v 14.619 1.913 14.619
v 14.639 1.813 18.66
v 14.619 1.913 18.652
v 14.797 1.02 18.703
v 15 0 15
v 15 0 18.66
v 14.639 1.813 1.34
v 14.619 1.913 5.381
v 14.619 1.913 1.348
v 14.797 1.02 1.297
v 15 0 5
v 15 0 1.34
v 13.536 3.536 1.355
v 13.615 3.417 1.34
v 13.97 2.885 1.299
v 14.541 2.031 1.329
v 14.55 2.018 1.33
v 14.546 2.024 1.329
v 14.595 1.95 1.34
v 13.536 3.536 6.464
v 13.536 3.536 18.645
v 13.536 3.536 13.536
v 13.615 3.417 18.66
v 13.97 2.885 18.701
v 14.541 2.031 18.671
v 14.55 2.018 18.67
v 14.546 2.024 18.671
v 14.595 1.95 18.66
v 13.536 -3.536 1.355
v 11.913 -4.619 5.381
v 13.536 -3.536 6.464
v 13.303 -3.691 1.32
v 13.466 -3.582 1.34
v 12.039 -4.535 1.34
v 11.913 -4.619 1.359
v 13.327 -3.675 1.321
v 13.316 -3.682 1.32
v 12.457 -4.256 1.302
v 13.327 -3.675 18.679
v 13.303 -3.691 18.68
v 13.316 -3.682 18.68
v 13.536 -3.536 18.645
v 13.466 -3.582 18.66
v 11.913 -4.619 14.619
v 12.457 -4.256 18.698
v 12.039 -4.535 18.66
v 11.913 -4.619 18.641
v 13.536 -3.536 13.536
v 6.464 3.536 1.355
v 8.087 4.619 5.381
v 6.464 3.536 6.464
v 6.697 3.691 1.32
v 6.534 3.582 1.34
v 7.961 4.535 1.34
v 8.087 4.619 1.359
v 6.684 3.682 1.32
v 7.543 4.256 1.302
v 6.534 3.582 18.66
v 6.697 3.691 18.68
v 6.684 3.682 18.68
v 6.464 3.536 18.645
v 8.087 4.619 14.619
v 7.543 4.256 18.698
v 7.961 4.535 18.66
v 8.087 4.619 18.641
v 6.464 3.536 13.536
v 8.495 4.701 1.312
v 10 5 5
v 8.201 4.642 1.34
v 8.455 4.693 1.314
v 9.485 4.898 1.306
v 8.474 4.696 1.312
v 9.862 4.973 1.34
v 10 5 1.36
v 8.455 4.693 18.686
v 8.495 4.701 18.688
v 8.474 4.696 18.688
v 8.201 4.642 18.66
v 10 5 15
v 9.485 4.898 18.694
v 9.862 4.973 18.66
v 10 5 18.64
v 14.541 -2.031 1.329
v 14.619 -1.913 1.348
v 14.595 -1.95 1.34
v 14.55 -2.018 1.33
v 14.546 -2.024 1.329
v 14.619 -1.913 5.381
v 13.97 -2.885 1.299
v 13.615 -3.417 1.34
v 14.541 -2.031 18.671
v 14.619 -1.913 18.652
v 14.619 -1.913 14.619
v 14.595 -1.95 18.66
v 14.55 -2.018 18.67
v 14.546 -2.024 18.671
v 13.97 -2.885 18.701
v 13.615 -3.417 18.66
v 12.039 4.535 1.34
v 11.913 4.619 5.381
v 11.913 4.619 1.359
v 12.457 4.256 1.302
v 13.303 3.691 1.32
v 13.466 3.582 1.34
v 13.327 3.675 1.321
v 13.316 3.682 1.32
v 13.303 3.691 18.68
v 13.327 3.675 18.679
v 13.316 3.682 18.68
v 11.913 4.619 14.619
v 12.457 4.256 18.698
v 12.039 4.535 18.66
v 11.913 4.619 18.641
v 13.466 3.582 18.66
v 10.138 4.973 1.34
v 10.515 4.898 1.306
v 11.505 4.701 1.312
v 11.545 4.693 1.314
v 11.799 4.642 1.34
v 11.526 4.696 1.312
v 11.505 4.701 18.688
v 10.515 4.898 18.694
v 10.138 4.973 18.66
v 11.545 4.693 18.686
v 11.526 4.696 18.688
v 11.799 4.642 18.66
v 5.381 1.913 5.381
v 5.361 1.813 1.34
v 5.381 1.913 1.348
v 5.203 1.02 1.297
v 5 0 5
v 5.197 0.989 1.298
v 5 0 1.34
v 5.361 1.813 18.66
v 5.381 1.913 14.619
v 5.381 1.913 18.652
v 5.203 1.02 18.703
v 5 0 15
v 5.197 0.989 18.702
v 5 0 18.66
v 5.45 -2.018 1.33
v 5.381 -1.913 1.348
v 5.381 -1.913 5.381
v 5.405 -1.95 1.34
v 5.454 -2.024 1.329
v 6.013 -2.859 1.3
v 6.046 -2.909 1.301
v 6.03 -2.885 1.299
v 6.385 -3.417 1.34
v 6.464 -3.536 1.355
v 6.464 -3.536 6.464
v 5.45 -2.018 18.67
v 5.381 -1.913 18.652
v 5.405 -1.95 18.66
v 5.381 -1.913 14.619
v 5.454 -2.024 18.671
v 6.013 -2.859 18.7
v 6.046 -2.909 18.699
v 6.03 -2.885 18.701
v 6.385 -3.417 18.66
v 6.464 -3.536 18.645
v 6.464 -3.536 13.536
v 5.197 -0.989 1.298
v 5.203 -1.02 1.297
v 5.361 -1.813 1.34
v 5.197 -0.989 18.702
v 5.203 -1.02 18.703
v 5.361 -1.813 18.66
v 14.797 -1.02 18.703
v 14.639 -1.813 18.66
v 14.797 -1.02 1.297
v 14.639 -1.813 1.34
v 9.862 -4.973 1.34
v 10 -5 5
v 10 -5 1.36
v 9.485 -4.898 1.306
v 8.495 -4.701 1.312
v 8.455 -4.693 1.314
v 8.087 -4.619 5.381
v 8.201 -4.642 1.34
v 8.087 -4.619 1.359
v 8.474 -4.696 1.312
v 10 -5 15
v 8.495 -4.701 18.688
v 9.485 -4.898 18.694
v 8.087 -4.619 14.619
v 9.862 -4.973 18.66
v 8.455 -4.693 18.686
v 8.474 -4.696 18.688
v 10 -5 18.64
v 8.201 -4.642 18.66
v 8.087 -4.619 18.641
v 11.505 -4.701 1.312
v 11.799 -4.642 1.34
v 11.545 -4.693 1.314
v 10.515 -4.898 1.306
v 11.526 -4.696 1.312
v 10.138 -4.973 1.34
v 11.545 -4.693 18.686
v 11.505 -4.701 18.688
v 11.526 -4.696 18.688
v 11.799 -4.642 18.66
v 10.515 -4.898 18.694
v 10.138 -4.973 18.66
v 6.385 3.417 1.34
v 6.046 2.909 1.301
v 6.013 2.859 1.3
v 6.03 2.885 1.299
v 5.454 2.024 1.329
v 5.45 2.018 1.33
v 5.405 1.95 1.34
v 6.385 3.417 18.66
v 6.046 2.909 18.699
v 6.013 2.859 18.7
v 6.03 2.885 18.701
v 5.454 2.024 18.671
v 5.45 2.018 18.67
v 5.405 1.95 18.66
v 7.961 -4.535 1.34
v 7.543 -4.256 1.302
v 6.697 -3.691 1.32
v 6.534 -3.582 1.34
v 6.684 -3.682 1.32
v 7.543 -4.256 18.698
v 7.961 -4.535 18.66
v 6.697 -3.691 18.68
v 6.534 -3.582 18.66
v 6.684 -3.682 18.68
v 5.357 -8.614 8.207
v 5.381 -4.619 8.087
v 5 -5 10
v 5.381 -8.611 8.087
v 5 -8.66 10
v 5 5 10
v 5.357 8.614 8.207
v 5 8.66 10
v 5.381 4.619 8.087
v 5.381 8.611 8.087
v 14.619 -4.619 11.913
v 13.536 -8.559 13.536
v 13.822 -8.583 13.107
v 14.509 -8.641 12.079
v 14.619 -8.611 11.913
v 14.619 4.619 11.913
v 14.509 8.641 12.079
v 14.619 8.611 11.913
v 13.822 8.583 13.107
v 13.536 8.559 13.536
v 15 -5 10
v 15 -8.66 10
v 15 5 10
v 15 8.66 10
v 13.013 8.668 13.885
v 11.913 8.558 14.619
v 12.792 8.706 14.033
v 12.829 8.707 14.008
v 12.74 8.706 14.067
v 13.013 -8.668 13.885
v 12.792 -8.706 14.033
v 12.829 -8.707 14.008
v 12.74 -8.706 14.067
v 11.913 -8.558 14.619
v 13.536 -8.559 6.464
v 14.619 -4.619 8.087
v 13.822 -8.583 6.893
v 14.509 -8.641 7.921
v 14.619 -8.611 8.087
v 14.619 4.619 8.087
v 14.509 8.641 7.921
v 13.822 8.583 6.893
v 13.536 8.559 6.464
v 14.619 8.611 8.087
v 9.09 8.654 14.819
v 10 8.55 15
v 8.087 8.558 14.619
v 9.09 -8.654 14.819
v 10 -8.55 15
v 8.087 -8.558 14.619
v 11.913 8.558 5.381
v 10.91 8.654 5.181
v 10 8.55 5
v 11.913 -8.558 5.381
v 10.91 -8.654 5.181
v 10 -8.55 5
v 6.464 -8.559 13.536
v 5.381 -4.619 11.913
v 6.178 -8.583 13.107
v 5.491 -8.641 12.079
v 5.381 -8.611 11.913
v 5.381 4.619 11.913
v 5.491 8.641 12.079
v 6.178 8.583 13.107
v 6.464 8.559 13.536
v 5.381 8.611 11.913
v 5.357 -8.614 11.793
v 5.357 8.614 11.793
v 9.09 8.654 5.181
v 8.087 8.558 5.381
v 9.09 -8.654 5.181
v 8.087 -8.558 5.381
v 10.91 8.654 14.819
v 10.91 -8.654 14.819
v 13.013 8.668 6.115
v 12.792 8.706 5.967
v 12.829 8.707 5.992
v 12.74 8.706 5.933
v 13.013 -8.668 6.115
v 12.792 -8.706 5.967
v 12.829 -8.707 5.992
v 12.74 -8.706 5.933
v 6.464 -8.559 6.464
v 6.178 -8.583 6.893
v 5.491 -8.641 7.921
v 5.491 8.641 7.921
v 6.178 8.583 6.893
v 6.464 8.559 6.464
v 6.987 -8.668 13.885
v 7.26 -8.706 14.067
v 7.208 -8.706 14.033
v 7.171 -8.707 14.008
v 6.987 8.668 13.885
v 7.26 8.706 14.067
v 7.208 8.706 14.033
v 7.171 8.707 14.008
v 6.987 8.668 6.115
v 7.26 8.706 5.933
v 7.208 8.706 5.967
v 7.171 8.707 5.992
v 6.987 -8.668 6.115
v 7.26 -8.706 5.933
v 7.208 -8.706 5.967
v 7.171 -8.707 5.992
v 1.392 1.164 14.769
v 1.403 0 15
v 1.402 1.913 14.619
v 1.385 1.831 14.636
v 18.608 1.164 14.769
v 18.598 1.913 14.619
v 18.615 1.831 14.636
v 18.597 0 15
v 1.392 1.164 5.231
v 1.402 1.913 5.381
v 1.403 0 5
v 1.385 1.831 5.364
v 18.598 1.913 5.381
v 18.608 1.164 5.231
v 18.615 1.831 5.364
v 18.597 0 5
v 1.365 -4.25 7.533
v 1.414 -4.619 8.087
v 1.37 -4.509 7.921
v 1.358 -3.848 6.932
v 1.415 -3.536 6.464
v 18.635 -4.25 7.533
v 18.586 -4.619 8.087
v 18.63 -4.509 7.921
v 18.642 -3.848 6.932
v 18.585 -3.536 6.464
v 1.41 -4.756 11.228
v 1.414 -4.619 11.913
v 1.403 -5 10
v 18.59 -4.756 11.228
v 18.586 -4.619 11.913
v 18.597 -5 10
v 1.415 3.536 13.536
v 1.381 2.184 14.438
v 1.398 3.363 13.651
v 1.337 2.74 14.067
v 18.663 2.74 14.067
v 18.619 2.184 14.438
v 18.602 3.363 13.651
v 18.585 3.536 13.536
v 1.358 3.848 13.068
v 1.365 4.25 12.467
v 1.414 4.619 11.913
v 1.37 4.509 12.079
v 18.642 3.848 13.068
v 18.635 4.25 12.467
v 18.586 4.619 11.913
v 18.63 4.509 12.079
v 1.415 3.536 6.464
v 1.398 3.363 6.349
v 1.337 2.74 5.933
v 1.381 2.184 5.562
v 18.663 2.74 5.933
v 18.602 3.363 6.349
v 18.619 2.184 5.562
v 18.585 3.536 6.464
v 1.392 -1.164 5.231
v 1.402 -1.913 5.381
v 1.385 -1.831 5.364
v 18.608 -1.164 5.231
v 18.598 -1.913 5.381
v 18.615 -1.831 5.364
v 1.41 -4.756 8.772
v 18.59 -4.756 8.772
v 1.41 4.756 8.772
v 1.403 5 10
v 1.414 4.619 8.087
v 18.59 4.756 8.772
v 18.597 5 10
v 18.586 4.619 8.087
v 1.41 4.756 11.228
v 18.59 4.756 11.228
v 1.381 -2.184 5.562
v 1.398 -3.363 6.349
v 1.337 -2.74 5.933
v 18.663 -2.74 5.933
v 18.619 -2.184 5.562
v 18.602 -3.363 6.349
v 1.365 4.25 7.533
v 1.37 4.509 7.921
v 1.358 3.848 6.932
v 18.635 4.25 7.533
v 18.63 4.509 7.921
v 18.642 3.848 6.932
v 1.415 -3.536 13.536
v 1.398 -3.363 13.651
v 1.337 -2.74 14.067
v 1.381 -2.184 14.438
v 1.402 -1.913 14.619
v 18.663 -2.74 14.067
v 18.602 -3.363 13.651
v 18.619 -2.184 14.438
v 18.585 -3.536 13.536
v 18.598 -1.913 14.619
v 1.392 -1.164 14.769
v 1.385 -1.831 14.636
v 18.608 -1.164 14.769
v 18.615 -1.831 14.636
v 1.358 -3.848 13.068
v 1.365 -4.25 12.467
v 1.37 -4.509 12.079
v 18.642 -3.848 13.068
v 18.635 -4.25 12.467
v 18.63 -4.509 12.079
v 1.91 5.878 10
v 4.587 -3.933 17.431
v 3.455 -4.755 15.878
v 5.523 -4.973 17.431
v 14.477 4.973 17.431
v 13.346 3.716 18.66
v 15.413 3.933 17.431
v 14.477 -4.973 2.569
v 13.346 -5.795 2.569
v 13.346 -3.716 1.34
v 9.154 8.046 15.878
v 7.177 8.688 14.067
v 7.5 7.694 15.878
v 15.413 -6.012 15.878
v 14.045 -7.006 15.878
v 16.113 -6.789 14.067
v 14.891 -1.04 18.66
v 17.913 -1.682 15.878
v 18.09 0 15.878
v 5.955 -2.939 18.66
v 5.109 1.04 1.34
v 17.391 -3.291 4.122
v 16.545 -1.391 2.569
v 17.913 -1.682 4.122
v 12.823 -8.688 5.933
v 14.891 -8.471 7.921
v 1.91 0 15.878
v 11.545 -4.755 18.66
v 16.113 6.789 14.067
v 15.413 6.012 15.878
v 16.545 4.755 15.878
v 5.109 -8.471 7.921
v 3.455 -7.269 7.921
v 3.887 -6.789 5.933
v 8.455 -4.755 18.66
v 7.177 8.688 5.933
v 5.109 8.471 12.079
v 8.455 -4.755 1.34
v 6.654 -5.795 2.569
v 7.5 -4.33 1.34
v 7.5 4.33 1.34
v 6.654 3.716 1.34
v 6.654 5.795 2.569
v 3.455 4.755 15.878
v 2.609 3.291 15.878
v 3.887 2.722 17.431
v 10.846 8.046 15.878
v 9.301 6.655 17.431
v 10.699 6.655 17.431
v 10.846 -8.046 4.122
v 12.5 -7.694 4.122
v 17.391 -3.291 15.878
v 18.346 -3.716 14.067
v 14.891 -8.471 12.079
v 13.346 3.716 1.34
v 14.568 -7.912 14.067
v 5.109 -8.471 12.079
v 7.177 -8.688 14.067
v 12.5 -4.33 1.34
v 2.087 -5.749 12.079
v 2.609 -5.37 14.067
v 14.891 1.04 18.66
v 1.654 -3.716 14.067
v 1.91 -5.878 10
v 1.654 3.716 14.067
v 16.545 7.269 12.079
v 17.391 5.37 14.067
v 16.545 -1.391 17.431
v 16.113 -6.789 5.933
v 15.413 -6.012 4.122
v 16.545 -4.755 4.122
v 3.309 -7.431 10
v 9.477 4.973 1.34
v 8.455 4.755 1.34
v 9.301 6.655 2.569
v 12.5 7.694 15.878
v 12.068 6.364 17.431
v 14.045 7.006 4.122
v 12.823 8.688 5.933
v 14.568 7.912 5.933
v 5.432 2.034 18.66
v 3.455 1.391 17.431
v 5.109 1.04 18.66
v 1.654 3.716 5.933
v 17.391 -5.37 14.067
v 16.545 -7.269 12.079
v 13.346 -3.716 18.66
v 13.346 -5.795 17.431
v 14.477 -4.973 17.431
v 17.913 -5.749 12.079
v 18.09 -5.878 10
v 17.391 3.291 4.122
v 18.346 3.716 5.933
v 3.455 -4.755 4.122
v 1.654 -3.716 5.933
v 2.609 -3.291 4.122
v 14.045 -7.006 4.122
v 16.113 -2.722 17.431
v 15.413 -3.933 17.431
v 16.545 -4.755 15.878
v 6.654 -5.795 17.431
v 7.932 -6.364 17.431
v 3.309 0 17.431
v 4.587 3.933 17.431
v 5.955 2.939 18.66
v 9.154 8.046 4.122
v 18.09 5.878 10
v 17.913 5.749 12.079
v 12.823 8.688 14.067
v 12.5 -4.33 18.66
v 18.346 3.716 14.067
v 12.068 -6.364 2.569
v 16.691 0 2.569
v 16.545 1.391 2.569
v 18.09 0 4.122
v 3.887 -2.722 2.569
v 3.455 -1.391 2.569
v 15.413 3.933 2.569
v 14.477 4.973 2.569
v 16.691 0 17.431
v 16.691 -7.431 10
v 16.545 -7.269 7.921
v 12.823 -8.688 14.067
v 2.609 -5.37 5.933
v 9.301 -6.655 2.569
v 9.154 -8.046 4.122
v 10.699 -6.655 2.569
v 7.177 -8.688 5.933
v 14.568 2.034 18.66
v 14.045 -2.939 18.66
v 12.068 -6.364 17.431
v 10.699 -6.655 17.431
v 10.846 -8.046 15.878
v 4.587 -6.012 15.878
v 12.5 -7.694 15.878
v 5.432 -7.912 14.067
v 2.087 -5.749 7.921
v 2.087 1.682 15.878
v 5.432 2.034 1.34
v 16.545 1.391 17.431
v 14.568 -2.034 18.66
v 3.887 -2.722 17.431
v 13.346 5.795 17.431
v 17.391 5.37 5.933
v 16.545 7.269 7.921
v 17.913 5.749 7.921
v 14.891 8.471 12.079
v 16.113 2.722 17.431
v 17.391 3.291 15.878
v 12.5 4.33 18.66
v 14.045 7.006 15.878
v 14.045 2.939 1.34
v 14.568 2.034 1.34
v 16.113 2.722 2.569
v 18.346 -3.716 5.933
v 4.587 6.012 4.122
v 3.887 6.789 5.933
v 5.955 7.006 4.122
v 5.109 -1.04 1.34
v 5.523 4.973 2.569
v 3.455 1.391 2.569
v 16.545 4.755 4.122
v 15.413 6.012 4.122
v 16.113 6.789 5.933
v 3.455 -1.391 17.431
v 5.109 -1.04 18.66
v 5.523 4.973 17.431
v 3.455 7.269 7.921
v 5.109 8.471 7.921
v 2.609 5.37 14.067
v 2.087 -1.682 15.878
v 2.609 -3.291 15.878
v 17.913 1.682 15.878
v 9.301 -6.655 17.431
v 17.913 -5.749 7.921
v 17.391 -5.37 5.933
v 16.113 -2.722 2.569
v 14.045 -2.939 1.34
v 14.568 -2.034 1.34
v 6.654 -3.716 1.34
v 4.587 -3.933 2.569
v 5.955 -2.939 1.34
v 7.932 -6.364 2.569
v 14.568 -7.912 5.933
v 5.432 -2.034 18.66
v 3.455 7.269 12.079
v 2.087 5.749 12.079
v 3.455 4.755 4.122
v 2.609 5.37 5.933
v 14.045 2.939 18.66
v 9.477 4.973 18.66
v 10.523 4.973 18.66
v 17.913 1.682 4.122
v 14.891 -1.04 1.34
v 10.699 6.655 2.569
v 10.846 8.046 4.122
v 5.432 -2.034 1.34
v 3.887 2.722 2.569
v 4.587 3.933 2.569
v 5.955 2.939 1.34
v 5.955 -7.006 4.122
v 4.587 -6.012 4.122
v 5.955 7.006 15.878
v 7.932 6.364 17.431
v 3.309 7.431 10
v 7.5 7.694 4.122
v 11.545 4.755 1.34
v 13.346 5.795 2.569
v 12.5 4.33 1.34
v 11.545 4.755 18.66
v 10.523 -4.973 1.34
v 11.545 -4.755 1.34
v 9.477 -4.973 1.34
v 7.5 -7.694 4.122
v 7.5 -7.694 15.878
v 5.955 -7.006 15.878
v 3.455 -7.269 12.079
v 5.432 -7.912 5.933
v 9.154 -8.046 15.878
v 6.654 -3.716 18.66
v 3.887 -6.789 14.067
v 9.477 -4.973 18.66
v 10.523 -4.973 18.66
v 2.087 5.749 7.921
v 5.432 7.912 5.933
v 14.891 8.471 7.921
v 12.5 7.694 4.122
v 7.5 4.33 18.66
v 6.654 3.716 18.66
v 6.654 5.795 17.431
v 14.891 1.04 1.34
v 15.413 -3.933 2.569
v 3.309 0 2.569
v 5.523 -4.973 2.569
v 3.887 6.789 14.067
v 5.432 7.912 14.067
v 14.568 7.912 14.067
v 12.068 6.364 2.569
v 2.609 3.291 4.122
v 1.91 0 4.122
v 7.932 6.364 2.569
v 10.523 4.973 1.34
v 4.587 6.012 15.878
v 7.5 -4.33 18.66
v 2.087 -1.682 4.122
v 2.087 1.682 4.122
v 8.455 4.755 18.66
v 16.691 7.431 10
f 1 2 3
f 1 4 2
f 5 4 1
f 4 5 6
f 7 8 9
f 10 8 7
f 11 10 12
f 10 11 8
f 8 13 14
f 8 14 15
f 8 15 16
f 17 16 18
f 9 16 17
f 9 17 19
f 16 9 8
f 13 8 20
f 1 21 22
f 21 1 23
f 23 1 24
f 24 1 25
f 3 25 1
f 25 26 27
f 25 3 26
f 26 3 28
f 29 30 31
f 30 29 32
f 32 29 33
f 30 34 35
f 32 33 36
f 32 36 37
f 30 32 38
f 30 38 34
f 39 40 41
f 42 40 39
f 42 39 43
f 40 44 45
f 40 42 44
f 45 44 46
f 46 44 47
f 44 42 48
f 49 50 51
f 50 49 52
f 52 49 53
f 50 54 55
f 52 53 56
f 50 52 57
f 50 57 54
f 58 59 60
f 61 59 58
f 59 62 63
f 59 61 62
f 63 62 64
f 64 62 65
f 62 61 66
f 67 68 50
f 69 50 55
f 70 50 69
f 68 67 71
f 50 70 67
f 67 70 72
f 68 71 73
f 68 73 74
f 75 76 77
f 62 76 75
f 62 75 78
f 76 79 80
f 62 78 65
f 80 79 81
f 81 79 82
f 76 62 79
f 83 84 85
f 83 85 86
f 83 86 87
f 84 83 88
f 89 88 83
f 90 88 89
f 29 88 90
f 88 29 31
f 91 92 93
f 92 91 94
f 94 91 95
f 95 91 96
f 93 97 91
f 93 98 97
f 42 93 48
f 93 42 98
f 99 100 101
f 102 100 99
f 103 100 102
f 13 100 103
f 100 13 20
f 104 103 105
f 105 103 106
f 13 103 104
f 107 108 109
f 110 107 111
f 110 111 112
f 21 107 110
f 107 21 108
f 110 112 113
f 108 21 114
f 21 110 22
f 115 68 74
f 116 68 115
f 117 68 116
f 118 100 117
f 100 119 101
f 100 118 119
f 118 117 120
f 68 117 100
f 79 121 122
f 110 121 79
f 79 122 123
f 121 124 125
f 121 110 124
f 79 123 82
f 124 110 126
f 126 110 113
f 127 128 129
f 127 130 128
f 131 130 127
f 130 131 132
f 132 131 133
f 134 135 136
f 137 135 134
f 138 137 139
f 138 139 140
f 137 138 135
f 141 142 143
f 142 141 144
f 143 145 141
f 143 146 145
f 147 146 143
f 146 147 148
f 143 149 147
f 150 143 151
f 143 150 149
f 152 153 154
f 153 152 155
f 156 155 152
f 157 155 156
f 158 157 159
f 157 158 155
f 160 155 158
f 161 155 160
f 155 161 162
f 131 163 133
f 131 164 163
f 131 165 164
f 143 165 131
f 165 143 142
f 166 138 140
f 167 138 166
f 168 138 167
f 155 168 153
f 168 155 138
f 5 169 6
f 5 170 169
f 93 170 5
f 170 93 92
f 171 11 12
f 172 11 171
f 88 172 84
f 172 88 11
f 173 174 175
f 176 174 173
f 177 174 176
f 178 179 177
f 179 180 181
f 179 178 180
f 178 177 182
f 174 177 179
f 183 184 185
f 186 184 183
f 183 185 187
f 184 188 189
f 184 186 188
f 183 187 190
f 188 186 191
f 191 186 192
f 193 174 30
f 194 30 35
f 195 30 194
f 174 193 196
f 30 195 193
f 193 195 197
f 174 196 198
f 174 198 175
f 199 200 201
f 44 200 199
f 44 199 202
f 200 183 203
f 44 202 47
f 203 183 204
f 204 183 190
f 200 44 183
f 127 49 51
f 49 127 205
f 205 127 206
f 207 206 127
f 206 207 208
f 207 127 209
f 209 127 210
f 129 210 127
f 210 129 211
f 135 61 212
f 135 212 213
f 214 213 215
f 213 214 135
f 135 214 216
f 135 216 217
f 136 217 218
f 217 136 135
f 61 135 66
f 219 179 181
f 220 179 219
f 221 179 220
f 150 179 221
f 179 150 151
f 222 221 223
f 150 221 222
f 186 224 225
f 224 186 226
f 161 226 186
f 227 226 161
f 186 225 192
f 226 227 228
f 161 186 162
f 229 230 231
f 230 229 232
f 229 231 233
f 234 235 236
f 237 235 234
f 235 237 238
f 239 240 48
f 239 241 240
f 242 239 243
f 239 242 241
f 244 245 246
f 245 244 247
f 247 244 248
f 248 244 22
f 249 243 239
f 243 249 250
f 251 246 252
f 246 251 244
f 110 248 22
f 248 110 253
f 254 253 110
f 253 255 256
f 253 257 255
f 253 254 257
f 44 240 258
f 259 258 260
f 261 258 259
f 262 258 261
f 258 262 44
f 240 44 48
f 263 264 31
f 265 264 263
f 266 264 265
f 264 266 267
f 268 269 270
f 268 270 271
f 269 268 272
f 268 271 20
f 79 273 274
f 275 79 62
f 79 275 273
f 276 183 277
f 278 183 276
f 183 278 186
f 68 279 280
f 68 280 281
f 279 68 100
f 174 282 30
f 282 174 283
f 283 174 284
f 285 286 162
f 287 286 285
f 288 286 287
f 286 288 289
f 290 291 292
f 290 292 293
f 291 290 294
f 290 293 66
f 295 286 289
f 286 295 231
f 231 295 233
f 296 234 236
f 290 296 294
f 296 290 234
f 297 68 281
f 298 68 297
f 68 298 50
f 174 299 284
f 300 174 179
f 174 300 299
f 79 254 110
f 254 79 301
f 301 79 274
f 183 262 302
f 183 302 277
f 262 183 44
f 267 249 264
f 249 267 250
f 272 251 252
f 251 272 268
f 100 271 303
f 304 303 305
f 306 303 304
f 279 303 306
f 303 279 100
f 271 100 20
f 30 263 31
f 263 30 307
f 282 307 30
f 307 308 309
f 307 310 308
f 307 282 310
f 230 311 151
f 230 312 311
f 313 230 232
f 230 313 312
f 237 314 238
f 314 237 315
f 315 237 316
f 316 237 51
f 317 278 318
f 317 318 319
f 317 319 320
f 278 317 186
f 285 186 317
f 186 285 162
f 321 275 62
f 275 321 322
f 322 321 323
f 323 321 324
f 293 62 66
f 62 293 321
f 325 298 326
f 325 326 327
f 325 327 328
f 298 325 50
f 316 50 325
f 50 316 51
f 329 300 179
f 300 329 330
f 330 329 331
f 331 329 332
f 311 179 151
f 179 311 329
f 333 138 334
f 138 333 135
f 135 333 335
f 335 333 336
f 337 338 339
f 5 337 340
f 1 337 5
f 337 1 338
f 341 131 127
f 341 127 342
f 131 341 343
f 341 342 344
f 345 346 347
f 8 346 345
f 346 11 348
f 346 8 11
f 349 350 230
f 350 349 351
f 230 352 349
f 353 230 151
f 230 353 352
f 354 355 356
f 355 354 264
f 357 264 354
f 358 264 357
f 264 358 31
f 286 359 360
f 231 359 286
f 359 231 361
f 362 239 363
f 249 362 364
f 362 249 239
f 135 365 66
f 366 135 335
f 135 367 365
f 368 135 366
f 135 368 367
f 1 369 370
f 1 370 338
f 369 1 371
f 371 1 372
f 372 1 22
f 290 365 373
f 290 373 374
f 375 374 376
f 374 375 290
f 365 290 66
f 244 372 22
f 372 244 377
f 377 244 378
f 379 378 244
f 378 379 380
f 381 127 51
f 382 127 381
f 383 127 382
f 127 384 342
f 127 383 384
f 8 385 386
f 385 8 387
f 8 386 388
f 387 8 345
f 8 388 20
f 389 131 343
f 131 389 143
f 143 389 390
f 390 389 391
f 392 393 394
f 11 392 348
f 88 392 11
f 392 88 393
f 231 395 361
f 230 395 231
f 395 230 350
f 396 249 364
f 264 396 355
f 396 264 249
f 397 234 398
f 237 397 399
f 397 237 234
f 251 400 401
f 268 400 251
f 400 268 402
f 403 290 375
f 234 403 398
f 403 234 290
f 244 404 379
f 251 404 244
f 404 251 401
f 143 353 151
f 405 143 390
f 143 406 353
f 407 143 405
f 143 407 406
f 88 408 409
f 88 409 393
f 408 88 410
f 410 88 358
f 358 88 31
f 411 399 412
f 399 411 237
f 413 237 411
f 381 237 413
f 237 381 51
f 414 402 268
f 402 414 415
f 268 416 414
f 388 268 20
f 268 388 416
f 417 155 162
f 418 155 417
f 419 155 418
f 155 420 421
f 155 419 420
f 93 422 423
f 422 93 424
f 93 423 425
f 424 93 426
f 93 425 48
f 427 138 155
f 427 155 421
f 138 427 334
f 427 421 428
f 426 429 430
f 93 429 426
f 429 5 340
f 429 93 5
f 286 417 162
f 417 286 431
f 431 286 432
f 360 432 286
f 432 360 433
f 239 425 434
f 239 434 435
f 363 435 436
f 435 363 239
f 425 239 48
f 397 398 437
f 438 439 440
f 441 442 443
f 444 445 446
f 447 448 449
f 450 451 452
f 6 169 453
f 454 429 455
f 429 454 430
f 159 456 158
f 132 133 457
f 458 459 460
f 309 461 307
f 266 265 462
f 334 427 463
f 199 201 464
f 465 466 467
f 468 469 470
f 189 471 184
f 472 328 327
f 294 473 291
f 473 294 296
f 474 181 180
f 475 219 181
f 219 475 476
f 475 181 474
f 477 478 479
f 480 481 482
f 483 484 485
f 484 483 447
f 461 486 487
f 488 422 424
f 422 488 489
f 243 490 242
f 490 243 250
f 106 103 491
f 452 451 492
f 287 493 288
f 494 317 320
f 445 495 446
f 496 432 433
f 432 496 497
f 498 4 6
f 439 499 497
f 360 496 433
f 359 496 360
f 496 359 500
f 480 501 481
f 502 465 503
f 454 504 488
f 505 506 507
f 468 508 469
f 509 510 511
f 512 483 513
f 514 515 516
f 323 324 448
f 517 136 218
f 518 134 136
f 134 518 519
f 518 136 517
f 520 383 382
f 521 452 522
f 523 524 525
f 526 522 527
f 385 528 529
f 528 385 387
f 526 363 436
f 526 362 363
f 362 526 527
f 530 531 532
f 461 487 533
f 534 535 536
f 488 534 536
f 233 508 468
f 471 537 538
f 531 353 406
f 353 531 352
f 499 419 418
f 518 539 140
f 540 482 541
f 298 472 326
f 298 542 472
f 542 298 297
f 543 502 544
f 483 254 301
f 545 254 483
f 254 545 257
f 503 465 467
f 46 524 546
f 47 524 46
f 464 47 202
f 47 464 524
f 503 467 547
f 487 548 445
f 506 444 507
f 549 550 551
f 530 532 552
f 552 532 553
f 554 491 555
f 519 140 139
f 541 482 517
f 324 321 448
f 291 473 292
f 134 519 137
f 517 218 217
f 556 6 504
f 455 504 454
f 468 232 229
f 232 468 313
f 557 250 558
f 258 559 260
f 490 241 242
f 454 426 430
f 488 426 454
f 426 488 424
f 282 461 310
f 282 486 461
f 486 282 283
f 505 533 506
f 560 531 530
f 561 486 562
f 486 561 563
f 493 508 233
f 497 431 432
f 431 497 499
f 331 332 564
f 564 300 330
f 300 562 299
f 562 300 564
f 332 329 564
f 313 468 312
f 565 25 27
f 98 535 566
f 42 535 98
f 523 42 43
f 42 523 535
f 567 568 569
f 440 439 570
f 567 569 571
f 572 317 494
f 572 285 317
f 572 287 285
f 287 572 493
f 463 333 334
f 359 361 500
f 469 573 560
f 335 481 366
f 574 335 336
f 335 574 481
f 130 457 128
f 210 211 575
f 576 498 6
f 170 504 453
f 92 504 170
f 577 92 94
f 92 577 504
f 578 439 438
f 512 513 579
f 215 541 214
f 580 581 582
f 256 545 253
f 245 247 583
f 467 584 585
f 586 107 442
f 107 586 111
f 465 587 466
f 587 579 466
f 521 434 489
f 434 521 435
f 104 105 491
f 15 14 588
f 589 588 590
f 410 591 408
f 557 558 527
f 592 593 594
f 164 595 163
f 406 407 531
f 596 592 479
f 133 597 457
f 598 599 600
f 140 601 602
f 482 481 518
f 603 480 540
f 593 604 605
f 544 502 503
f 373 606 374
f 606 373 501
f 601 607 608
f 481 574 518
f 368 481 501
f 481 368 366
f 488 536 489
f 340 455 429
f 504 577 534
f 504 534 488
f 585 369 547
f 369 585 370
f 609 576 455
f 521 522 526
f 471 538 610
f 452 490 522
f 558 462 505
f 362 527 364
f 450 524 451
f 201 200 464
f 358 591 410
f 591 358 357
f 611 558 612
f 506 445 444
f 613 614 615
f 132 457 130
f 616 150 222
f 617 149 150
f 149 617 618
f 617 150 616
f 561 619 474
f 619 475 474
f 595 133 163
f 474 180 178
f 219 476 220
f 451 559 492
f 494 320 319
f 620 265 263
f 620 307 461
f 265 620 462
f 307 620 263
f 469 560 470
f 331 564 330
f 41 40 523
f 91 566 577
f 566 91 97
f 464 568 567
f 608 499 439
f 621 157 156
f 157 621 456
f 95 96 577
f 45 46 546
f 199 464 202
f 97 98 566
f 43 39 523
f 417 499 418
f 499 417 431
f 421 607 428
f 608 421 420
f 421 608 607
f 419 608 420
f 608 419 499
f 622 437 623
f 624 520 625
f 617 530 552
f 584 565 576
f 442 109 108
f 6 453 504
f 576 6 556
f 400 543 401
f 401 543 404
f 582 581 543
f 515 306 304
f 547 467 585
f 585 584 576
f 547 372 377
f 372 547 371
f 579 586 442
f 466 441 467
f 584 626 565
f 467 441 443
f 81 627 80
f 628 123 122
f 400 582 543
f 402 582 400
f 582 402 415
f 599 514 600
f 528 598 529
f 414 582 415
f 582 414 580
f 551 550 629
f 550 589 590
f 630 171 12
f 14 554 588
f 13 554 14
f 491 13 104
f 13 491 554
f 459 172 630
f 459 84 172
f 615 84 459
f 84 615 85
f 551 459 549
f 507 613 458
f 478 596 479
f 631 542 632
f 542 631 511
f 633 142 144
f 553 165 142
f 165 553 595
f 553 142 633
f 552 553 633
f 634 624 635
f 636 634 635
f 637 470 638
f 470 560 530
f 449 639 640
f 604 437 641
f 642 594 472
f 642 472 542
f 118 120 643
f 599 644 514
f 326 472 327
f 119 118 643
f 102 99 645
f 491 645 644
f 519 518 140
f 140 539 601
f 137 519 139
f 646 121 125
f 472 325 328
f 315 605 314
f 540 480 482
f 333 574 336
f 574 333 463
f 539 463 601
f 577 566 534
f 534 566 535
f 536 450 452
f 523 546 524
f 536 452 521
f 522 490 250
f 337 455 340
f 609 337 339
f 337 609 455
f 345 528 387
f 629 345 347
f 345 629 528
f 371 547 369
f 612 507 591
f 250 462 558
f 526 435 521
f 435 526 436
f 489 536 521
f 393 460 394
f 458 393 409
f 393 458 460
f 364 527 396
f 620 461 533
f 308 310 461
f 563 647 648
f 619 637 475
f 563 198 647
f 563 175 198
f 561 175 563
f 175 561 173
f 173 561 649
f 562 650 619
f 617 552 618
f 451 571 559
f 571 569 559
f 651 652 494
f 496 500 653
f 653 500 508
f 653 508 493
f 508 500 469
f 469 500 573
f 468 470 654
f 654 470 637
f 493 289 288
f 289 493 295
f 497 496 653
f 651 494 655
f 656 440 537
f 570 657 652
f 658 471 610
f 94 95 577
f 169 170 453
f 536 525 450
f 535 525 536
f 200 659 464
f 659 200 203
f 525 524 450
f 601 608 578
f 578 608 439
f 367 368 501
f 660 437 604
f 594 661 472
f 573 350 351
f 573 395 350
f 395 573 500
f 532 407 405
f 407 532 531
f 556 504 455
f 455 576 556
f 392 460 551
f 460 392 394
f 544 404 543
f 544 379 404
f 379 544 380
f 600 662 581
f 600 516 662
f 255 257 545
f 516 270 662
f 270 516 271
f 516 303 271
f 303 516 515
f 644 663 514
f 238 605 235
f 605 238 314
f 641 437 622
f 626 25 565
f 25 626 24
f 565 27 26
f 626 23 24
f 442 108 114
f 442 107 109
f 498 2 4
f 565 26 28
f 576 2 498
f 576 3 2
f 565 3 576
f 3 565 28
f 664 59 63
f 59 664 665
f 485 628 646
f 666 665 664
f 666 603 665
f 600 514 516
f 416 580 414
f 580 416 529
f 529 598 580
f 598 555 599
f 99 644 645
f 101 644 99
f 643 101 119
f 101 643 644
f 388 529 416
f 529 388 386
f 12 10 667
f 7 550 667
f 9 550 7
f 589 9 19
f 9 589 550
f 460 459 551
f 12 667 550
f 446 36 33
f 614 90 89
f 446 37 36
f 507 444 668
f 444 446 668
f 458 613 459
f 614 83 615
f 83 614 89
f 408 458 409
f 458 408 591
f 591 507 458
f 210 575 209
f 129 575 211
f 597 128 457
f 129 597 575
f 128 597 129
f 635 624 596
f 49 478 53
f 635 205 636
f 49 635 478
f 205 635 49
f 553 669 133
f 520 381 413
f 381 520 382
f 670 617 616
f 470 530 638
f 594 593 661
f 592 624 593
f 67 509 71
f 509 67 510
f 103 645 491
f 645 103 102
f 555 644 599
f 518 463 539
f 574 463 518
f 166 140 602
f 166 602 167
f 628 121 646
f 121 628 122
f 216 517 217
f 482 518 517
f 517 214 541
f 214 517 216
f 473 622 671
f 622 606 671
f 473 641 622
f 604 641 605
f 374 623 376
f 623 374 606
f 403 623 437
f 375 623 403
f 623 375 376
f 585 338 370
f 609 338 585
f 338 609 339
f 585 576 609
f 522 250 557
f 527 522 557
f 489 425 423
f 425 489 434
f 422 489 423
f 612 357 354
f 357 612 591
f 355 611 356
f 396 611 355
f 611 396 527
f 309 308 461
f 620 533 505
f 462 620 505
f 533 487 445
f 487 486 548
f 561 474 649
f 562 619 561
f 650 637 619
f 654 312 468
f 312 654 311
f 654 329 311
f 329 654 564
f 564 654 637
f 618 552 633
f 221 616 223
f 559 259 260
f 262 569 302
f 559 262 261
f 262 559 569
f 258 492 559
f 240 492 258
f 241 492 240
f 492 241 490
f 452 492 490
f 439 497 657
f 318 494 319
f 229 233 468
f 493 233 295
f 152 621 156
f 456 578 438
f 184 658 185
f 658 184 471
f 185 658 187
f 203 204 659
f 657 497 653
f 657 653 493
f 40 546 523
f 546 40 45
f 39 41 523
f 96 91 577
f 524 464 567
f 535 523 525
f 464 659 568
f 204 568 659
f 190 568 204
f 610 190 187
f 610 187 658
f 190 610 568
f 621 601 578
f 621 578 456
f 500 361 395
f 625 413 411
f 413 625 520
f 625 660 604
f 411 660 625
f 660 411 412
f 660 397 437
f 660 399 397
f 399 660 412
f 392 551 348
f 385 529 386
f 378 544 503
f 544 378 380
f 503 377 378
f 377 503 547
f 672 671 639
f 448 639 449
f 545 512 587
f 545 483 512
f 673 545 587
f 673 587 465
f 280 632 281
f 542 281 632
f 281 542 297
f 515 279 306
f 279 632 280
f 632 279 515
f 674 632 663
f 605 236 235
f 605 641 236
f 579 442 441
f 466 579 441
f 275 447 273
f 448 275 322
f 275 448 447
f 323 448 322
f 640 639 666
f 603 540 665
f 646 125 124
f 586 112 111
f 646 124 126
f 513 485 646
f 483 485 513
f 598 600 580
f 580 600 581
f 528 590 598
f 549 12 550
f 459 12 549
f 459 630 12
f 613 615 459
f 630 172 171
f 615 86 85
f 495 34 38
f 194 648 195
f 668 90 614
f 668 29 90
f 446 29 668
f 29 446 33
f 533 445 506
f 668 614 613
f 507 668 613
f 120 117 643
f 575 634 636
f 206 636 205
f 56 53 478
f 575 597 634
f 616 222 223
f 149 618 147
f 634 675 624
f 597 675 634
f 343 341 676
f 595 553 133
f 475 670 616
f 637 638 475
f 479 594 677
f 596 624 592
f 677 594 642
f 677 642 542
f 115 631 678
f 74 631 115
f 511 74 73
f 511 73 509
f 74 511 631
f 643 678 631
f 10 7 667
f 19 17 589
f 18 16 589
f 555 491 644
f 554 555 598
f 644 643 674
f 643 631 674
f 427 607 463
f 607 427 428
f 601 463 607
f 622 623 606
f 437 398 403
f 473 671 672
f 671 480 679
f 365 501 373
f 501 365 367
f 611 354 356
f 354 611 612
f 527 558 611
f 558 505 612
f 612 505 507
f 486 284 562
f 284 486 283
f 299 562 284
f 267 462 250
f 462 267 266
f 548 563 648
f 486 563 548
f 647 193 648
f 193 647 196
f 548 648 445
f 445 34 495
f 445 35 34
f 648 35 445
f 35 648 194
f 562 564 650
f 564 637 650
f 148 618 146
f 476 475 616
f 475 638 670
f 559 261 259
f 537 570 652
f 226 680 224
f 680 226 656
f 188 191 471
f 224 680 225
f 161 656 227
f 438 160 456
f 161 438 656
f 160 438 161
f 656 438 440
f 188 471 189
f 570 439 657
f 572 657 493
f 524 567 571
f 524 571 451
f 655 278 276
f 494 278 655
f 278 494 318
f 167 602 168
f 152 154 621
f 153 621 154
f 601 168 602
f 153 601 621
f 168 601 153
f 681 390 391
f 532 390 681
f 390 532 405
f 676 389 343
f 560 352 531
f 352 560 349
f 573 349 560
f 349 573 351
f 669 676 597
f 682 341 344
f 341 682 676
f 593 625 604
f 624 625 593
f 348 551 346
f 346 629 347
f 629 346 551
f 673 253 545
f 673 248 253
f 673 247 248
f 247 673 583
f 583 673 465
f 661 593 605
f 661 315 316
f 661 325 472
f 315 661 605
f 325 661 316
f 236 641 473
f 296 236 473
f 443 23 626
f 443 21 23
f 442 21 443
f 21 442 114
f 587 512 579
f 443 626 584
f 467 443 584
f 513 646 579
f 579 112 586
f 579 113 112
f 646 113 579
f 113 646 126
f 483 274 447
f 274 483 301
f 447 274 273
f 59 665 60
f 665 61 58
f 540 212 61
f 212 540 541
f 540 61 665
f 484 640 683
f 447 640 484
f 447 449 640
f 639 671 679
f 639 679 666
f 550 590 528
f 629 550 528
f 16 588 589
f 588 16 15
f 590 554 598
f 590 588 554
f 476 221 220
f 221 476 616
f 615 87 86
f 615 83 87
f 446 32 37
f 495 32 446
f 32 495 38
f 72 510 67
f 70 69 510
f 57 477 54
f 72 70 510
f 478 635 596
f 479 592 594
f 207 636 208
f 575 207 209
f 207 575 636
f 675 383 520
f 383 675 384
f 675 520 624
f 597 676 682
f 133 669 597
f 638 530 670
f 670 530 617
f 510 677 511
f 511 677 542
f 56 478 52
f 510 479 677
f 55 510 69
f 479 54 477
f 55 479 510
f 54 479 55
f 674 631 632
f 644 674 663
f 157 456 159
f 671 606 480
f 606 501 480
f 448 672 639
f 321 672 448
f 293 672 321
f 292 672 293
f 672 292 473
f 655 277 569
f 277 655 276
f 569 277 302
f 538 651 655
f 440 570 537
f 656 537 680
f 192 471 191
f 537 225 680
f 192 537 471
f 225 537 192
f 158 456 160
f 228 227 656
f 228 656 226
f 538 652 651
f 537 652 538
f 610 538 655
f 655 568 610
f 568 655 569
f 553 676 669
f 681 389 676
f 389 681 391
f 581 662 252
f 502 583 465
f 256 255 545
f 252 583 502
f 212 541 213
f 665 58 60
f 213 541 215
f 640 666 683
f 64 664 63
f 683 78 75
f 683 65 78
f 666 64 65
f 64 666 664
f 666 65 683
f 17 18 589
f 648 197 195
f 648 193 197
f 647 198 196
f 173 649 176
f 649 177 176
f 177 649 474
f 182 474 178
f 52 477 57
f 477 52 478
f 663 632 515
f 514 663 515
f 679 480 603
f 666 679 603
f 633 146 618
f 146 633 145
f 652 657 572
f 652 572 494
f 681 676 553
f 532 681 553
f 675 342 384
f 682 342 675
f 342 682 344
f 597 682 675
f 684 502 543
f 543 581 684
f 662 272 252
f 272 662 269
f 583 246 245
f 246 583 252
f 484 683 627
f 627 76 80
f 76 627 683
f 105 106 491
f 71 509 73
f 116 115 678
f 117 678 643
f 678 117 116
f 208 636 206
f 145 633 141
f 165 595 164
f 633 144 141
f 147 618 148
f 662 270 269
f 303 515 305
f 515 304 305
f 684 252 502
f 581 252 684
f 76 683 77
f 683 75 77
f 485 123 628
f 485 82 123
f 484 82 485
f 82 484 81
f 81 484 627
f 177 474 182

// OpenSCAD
// Radius of big sphere
sphere_radius = 10; // [2:100]

// Radius of the holes in the sphere
hole_radius = 5; // [1:100]

difference(){
 translate([sphere_radius,0,sphere_radius])
  sphere(sphere_radius);
 union(){
  translate([sphere_radius,0,0]) 
   cylinder(2*sphere_radius,hole_radius,hole_radius);
  translate([sphere_radius,sphere_radius,sphere_radius]) rotate([90,0,0]) 
   cylinder(2*sphere_radius,hole_radius,hole_radius);
  translate([0,0,sphere_radius]) rotate([0,90,0]) 
   cylinder(2*sphere_radius,hole_radius,hole_radius);
 }
}
